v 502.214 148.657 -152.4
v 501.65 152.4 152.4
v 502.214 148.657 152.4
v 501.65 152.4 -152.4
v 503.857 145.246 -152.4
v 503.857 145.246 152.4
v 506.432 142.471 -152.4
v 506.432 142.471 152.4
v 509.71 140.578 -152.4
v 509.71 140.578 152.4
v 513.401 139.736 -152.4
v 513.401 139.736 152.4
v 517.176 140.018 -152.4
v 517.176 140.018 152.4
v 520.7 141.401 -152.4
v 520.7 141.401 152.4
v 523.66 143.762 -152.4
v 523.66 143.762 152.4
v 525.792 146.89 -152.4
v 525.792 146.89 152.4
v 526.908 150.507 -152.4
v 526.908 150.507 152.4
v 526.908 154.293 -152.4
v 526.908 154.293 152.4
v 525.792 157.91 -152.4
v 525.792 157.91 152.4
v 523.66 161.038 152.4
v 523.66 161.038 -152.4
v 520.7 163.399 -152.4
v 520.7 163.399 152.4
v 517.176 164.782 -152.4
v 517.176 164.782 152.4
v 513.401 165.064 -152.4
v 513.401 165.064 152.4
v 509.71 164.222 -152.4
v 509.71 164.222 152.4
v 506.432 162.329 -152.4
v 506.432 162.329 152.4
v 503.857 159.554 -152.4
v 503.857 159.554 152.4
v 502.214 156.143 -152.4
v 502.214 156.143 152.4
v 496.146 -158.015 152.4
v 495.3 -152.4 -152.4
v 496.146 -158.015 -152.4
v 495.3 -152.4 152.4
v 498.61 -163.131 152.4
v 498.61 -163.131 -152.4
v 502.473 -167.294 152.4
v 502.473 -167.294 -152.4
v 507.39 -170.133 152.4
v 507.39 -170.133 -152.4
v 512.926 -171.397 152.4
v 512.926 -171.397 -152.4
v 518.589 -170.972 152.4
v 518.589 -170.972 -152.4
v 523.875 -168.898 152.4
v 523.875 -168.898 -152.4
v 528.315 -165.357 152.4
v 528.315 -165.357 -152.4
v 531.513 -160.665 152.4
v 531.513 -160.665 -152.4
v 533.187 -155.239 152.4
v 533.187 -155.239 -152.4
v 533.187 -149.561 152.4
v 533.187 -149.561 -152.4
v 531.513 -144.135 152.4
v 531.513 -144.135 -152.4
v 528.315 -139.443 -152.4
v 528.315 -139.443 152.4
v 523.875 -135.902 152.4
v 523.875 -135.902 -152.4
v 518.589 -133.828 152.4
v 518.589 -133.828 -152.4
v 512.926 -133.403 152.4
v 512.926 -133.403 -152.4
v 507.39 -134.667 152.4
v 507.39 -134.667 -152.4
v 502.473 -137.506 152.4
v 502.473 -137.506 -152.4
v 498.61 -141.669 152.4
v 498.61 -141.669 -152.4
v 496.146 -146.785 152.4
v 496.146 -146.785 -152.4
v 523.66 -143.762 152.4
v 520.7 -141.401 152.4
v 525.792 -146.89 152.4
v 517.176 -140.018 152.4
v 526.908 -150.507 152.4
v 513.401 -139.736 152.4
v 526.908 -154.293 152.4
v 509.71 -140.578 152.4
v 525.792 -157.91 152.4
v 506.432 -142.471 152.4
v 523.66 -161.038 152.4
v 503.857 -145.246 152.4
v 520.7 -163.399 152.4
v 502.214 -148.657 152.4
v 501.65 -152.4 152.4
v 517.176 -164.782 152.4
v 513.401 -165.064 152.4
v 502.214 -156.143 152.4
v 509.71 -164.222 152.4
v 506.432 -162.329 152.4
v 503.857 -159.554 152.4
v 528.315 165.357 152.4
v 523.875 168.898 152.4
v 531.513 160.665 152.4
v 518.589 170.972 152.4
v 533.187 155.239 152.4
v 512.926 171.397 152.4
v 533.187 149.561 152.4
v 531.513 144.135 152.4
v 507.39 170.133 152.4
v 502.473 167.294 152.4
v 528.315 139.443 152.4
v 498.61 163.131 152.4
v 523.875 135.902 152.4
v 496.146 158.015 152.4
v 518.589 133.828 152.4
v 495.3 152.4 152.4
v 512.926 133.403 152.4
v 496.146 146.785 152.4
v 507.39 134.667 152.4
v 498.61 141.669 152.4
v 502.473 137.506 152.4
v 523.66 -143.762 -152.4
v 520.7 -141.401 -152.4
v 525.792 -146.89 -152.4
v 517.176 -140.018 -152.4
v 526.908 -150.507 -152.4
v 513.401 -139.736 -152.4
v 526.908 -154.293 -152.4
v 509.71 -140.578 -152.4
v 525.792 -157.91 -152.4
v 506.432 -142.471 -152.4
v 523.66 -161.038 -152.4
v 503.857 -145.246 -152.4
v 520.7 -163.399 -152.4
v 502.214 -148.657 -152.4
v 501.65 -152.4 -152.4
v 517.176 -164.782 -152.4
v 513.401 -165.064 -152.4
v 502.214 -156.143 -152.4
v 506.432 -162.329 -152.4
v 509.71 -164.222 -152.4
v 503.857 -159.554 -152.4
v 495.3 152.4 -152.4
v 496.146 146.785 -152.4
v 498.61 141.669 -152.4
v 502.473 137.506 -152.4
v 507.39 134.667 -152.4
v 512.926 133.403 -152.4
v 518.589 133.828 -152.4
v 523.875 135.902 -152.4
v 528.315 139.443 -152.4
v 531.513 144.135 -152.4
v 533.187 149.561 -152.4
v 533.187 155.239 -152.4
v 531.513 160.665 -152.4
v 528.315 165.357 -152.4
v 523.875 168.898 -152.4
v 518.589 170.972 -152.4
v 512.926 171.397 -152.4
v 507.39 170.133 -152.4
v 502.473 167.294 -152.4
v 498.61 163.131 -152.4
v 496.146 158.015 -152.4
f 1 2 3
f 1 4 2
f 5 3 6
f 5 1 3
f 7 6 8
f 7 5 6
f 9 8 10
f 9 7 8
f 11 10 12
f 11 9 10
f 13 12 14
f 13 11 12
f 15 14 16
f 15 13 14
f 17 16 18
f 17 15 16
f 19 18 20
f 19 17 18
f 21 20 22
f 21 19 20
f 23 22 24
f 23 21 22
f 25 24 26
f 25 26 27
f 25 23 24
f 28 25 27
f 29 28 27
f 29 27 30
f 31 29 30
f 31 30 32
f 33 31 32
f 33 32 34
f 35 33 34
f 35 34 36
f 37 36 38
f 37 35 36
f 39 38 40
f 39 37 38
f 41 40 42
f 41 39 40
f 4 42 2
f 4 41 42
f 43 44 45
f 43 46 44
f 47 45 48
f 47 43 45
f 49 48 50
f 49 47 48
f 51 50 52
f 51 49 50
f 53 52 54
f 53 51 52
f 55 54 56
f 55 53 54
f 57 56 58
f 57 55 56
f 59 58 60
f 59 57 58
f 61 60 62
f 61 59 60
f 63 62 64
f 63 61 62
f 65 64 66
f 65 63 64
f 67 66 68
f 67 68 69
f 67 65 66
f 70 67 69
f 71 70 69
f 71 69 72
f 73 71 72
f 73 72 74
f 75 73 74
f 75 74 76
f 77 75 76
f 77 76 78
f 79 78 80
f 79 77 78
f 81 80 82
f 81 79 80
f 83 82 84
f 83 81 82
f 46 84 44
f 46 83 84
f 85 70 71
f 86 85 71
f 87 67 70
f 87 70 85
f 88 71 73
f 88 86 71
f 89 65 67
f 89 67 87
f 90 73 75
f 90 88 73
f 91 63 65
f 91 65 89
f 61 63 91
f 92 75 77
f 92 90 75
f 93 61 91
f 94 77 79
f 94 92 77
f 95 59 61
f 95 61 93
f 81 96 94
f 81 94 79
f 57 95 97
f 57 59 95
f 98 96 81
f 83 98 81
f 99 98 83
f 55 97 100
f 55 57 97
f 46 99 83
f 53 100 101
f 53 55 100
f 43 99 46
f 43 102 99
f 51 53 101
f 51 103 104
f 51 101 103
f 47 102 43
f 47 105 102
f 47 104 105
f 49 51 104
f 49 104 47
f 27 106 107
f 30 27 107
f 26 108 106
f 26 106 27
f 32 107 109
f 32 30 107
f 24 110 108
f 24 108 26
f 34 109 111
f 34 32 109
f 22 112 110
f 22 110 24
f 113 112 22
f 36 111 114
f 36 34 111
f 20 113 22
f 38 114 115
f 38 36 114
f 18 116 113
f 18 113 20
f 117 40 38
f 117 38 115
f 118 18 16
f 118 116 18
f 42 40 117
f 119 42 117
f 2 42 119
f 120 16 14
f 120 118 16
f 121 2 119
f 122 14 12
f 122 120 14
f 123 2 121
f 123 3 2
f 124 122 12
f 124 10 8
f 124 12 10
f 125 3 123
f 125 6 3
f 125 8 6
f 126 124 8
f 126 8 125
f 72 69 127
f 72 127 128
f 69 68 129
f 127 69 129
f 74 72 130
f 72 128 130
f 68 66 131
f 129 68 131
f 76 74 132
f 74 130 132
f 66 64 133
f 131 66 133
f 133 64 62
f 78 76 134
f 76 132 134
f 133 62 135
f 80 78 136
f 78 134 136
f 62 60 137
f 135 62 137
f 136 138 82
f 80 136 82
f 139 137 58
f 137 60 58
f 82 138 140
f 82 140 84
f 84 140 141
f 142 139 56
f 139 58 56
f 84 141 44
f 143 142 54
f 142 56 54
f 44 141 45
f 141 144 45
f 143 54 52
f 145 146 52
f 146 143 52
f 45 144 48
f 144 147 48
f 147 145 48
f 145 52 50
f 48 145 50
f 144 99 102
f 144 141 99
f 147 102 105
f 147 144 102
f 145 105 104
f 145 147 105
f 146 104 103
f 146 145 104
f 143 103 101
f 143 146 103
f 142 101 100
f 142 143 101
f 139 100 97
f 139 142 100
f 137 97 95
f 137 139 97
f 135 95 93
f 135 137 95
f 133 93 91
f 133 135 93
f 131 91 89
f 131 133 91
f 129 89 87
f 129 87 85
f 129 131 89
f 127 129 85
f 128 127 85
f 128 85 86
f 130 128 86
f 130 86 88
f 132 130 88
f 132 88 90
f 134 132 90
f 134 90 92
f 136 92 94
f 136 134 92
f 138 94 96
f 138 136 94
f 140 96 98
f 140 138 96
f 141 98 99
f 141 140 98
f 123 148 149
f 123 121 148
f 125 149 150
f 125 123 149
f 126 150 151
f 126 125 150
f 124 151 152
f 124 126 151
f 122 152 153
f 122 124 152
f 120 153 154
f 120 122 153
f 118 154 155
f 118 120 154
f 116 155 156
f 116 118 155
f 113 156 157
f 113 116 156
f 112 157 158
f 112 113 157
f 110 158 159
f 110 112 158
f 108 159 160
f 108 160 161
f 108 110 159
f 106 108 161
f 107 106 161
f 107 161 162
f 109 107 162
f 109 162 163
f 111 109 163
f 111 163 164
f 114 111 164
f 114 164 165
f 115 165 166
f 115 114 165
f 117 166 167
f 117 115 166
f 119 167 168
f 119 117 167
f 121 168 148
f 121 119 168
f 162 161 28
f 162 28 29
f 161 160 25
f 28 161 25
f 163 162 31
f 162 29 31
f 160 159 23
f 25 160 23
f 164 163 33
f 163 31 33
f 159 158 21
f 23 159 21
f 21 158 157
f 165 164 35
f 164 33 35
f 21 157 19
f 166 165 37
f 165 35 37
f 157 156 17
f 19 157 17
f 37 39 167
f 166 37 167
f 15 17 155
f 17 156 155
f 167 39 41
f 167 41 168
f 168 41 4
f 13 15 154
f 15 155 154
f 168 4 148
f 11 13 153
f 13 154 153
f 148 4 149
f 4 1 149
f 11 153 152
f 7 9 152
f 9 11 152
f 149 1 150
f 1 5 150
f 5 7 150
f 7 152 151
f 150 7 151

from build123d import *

# Parameters (mm, degrees)
SKETCH1_R        = 19.05
SKETCH1_R_2      = 12.7
EXTRUDE1_DEPTH   = 152.4
EXTRUDE1_2_DEPTH = 152.4


with BuildPart() as part:
    # Sketch1 → Extrude1 (new, symmetric)
    with BuildSketch(Plane.XY):
        with Locations((514.35, 152.4)):
            Circle(SKETCH1_R)
        with Locations((514.35, 152.4)):
            Circle(SKETCH1_R_2, mode=Mode.SUBTRACT)
    extrude(amount=EXTRUDE1_DEPTH, both=True)


with BuildPart() as body_2:
    # Sketch1 → Extrude1 2 (new, symmetric)
    with BuildSketch(Plane.XY):
        with Locations((514.35, -152.4)):
            Circle(SKETCH1_R)
        with Locations((514.35, -152.4)):
            Circle(SKETCH1_R_2, mode=Mode.SUBTRACT)
    extrude(amount=EXTRUDE1_2_DEPTH, both=True)


solid = Compound([part.part, body_2.part])
